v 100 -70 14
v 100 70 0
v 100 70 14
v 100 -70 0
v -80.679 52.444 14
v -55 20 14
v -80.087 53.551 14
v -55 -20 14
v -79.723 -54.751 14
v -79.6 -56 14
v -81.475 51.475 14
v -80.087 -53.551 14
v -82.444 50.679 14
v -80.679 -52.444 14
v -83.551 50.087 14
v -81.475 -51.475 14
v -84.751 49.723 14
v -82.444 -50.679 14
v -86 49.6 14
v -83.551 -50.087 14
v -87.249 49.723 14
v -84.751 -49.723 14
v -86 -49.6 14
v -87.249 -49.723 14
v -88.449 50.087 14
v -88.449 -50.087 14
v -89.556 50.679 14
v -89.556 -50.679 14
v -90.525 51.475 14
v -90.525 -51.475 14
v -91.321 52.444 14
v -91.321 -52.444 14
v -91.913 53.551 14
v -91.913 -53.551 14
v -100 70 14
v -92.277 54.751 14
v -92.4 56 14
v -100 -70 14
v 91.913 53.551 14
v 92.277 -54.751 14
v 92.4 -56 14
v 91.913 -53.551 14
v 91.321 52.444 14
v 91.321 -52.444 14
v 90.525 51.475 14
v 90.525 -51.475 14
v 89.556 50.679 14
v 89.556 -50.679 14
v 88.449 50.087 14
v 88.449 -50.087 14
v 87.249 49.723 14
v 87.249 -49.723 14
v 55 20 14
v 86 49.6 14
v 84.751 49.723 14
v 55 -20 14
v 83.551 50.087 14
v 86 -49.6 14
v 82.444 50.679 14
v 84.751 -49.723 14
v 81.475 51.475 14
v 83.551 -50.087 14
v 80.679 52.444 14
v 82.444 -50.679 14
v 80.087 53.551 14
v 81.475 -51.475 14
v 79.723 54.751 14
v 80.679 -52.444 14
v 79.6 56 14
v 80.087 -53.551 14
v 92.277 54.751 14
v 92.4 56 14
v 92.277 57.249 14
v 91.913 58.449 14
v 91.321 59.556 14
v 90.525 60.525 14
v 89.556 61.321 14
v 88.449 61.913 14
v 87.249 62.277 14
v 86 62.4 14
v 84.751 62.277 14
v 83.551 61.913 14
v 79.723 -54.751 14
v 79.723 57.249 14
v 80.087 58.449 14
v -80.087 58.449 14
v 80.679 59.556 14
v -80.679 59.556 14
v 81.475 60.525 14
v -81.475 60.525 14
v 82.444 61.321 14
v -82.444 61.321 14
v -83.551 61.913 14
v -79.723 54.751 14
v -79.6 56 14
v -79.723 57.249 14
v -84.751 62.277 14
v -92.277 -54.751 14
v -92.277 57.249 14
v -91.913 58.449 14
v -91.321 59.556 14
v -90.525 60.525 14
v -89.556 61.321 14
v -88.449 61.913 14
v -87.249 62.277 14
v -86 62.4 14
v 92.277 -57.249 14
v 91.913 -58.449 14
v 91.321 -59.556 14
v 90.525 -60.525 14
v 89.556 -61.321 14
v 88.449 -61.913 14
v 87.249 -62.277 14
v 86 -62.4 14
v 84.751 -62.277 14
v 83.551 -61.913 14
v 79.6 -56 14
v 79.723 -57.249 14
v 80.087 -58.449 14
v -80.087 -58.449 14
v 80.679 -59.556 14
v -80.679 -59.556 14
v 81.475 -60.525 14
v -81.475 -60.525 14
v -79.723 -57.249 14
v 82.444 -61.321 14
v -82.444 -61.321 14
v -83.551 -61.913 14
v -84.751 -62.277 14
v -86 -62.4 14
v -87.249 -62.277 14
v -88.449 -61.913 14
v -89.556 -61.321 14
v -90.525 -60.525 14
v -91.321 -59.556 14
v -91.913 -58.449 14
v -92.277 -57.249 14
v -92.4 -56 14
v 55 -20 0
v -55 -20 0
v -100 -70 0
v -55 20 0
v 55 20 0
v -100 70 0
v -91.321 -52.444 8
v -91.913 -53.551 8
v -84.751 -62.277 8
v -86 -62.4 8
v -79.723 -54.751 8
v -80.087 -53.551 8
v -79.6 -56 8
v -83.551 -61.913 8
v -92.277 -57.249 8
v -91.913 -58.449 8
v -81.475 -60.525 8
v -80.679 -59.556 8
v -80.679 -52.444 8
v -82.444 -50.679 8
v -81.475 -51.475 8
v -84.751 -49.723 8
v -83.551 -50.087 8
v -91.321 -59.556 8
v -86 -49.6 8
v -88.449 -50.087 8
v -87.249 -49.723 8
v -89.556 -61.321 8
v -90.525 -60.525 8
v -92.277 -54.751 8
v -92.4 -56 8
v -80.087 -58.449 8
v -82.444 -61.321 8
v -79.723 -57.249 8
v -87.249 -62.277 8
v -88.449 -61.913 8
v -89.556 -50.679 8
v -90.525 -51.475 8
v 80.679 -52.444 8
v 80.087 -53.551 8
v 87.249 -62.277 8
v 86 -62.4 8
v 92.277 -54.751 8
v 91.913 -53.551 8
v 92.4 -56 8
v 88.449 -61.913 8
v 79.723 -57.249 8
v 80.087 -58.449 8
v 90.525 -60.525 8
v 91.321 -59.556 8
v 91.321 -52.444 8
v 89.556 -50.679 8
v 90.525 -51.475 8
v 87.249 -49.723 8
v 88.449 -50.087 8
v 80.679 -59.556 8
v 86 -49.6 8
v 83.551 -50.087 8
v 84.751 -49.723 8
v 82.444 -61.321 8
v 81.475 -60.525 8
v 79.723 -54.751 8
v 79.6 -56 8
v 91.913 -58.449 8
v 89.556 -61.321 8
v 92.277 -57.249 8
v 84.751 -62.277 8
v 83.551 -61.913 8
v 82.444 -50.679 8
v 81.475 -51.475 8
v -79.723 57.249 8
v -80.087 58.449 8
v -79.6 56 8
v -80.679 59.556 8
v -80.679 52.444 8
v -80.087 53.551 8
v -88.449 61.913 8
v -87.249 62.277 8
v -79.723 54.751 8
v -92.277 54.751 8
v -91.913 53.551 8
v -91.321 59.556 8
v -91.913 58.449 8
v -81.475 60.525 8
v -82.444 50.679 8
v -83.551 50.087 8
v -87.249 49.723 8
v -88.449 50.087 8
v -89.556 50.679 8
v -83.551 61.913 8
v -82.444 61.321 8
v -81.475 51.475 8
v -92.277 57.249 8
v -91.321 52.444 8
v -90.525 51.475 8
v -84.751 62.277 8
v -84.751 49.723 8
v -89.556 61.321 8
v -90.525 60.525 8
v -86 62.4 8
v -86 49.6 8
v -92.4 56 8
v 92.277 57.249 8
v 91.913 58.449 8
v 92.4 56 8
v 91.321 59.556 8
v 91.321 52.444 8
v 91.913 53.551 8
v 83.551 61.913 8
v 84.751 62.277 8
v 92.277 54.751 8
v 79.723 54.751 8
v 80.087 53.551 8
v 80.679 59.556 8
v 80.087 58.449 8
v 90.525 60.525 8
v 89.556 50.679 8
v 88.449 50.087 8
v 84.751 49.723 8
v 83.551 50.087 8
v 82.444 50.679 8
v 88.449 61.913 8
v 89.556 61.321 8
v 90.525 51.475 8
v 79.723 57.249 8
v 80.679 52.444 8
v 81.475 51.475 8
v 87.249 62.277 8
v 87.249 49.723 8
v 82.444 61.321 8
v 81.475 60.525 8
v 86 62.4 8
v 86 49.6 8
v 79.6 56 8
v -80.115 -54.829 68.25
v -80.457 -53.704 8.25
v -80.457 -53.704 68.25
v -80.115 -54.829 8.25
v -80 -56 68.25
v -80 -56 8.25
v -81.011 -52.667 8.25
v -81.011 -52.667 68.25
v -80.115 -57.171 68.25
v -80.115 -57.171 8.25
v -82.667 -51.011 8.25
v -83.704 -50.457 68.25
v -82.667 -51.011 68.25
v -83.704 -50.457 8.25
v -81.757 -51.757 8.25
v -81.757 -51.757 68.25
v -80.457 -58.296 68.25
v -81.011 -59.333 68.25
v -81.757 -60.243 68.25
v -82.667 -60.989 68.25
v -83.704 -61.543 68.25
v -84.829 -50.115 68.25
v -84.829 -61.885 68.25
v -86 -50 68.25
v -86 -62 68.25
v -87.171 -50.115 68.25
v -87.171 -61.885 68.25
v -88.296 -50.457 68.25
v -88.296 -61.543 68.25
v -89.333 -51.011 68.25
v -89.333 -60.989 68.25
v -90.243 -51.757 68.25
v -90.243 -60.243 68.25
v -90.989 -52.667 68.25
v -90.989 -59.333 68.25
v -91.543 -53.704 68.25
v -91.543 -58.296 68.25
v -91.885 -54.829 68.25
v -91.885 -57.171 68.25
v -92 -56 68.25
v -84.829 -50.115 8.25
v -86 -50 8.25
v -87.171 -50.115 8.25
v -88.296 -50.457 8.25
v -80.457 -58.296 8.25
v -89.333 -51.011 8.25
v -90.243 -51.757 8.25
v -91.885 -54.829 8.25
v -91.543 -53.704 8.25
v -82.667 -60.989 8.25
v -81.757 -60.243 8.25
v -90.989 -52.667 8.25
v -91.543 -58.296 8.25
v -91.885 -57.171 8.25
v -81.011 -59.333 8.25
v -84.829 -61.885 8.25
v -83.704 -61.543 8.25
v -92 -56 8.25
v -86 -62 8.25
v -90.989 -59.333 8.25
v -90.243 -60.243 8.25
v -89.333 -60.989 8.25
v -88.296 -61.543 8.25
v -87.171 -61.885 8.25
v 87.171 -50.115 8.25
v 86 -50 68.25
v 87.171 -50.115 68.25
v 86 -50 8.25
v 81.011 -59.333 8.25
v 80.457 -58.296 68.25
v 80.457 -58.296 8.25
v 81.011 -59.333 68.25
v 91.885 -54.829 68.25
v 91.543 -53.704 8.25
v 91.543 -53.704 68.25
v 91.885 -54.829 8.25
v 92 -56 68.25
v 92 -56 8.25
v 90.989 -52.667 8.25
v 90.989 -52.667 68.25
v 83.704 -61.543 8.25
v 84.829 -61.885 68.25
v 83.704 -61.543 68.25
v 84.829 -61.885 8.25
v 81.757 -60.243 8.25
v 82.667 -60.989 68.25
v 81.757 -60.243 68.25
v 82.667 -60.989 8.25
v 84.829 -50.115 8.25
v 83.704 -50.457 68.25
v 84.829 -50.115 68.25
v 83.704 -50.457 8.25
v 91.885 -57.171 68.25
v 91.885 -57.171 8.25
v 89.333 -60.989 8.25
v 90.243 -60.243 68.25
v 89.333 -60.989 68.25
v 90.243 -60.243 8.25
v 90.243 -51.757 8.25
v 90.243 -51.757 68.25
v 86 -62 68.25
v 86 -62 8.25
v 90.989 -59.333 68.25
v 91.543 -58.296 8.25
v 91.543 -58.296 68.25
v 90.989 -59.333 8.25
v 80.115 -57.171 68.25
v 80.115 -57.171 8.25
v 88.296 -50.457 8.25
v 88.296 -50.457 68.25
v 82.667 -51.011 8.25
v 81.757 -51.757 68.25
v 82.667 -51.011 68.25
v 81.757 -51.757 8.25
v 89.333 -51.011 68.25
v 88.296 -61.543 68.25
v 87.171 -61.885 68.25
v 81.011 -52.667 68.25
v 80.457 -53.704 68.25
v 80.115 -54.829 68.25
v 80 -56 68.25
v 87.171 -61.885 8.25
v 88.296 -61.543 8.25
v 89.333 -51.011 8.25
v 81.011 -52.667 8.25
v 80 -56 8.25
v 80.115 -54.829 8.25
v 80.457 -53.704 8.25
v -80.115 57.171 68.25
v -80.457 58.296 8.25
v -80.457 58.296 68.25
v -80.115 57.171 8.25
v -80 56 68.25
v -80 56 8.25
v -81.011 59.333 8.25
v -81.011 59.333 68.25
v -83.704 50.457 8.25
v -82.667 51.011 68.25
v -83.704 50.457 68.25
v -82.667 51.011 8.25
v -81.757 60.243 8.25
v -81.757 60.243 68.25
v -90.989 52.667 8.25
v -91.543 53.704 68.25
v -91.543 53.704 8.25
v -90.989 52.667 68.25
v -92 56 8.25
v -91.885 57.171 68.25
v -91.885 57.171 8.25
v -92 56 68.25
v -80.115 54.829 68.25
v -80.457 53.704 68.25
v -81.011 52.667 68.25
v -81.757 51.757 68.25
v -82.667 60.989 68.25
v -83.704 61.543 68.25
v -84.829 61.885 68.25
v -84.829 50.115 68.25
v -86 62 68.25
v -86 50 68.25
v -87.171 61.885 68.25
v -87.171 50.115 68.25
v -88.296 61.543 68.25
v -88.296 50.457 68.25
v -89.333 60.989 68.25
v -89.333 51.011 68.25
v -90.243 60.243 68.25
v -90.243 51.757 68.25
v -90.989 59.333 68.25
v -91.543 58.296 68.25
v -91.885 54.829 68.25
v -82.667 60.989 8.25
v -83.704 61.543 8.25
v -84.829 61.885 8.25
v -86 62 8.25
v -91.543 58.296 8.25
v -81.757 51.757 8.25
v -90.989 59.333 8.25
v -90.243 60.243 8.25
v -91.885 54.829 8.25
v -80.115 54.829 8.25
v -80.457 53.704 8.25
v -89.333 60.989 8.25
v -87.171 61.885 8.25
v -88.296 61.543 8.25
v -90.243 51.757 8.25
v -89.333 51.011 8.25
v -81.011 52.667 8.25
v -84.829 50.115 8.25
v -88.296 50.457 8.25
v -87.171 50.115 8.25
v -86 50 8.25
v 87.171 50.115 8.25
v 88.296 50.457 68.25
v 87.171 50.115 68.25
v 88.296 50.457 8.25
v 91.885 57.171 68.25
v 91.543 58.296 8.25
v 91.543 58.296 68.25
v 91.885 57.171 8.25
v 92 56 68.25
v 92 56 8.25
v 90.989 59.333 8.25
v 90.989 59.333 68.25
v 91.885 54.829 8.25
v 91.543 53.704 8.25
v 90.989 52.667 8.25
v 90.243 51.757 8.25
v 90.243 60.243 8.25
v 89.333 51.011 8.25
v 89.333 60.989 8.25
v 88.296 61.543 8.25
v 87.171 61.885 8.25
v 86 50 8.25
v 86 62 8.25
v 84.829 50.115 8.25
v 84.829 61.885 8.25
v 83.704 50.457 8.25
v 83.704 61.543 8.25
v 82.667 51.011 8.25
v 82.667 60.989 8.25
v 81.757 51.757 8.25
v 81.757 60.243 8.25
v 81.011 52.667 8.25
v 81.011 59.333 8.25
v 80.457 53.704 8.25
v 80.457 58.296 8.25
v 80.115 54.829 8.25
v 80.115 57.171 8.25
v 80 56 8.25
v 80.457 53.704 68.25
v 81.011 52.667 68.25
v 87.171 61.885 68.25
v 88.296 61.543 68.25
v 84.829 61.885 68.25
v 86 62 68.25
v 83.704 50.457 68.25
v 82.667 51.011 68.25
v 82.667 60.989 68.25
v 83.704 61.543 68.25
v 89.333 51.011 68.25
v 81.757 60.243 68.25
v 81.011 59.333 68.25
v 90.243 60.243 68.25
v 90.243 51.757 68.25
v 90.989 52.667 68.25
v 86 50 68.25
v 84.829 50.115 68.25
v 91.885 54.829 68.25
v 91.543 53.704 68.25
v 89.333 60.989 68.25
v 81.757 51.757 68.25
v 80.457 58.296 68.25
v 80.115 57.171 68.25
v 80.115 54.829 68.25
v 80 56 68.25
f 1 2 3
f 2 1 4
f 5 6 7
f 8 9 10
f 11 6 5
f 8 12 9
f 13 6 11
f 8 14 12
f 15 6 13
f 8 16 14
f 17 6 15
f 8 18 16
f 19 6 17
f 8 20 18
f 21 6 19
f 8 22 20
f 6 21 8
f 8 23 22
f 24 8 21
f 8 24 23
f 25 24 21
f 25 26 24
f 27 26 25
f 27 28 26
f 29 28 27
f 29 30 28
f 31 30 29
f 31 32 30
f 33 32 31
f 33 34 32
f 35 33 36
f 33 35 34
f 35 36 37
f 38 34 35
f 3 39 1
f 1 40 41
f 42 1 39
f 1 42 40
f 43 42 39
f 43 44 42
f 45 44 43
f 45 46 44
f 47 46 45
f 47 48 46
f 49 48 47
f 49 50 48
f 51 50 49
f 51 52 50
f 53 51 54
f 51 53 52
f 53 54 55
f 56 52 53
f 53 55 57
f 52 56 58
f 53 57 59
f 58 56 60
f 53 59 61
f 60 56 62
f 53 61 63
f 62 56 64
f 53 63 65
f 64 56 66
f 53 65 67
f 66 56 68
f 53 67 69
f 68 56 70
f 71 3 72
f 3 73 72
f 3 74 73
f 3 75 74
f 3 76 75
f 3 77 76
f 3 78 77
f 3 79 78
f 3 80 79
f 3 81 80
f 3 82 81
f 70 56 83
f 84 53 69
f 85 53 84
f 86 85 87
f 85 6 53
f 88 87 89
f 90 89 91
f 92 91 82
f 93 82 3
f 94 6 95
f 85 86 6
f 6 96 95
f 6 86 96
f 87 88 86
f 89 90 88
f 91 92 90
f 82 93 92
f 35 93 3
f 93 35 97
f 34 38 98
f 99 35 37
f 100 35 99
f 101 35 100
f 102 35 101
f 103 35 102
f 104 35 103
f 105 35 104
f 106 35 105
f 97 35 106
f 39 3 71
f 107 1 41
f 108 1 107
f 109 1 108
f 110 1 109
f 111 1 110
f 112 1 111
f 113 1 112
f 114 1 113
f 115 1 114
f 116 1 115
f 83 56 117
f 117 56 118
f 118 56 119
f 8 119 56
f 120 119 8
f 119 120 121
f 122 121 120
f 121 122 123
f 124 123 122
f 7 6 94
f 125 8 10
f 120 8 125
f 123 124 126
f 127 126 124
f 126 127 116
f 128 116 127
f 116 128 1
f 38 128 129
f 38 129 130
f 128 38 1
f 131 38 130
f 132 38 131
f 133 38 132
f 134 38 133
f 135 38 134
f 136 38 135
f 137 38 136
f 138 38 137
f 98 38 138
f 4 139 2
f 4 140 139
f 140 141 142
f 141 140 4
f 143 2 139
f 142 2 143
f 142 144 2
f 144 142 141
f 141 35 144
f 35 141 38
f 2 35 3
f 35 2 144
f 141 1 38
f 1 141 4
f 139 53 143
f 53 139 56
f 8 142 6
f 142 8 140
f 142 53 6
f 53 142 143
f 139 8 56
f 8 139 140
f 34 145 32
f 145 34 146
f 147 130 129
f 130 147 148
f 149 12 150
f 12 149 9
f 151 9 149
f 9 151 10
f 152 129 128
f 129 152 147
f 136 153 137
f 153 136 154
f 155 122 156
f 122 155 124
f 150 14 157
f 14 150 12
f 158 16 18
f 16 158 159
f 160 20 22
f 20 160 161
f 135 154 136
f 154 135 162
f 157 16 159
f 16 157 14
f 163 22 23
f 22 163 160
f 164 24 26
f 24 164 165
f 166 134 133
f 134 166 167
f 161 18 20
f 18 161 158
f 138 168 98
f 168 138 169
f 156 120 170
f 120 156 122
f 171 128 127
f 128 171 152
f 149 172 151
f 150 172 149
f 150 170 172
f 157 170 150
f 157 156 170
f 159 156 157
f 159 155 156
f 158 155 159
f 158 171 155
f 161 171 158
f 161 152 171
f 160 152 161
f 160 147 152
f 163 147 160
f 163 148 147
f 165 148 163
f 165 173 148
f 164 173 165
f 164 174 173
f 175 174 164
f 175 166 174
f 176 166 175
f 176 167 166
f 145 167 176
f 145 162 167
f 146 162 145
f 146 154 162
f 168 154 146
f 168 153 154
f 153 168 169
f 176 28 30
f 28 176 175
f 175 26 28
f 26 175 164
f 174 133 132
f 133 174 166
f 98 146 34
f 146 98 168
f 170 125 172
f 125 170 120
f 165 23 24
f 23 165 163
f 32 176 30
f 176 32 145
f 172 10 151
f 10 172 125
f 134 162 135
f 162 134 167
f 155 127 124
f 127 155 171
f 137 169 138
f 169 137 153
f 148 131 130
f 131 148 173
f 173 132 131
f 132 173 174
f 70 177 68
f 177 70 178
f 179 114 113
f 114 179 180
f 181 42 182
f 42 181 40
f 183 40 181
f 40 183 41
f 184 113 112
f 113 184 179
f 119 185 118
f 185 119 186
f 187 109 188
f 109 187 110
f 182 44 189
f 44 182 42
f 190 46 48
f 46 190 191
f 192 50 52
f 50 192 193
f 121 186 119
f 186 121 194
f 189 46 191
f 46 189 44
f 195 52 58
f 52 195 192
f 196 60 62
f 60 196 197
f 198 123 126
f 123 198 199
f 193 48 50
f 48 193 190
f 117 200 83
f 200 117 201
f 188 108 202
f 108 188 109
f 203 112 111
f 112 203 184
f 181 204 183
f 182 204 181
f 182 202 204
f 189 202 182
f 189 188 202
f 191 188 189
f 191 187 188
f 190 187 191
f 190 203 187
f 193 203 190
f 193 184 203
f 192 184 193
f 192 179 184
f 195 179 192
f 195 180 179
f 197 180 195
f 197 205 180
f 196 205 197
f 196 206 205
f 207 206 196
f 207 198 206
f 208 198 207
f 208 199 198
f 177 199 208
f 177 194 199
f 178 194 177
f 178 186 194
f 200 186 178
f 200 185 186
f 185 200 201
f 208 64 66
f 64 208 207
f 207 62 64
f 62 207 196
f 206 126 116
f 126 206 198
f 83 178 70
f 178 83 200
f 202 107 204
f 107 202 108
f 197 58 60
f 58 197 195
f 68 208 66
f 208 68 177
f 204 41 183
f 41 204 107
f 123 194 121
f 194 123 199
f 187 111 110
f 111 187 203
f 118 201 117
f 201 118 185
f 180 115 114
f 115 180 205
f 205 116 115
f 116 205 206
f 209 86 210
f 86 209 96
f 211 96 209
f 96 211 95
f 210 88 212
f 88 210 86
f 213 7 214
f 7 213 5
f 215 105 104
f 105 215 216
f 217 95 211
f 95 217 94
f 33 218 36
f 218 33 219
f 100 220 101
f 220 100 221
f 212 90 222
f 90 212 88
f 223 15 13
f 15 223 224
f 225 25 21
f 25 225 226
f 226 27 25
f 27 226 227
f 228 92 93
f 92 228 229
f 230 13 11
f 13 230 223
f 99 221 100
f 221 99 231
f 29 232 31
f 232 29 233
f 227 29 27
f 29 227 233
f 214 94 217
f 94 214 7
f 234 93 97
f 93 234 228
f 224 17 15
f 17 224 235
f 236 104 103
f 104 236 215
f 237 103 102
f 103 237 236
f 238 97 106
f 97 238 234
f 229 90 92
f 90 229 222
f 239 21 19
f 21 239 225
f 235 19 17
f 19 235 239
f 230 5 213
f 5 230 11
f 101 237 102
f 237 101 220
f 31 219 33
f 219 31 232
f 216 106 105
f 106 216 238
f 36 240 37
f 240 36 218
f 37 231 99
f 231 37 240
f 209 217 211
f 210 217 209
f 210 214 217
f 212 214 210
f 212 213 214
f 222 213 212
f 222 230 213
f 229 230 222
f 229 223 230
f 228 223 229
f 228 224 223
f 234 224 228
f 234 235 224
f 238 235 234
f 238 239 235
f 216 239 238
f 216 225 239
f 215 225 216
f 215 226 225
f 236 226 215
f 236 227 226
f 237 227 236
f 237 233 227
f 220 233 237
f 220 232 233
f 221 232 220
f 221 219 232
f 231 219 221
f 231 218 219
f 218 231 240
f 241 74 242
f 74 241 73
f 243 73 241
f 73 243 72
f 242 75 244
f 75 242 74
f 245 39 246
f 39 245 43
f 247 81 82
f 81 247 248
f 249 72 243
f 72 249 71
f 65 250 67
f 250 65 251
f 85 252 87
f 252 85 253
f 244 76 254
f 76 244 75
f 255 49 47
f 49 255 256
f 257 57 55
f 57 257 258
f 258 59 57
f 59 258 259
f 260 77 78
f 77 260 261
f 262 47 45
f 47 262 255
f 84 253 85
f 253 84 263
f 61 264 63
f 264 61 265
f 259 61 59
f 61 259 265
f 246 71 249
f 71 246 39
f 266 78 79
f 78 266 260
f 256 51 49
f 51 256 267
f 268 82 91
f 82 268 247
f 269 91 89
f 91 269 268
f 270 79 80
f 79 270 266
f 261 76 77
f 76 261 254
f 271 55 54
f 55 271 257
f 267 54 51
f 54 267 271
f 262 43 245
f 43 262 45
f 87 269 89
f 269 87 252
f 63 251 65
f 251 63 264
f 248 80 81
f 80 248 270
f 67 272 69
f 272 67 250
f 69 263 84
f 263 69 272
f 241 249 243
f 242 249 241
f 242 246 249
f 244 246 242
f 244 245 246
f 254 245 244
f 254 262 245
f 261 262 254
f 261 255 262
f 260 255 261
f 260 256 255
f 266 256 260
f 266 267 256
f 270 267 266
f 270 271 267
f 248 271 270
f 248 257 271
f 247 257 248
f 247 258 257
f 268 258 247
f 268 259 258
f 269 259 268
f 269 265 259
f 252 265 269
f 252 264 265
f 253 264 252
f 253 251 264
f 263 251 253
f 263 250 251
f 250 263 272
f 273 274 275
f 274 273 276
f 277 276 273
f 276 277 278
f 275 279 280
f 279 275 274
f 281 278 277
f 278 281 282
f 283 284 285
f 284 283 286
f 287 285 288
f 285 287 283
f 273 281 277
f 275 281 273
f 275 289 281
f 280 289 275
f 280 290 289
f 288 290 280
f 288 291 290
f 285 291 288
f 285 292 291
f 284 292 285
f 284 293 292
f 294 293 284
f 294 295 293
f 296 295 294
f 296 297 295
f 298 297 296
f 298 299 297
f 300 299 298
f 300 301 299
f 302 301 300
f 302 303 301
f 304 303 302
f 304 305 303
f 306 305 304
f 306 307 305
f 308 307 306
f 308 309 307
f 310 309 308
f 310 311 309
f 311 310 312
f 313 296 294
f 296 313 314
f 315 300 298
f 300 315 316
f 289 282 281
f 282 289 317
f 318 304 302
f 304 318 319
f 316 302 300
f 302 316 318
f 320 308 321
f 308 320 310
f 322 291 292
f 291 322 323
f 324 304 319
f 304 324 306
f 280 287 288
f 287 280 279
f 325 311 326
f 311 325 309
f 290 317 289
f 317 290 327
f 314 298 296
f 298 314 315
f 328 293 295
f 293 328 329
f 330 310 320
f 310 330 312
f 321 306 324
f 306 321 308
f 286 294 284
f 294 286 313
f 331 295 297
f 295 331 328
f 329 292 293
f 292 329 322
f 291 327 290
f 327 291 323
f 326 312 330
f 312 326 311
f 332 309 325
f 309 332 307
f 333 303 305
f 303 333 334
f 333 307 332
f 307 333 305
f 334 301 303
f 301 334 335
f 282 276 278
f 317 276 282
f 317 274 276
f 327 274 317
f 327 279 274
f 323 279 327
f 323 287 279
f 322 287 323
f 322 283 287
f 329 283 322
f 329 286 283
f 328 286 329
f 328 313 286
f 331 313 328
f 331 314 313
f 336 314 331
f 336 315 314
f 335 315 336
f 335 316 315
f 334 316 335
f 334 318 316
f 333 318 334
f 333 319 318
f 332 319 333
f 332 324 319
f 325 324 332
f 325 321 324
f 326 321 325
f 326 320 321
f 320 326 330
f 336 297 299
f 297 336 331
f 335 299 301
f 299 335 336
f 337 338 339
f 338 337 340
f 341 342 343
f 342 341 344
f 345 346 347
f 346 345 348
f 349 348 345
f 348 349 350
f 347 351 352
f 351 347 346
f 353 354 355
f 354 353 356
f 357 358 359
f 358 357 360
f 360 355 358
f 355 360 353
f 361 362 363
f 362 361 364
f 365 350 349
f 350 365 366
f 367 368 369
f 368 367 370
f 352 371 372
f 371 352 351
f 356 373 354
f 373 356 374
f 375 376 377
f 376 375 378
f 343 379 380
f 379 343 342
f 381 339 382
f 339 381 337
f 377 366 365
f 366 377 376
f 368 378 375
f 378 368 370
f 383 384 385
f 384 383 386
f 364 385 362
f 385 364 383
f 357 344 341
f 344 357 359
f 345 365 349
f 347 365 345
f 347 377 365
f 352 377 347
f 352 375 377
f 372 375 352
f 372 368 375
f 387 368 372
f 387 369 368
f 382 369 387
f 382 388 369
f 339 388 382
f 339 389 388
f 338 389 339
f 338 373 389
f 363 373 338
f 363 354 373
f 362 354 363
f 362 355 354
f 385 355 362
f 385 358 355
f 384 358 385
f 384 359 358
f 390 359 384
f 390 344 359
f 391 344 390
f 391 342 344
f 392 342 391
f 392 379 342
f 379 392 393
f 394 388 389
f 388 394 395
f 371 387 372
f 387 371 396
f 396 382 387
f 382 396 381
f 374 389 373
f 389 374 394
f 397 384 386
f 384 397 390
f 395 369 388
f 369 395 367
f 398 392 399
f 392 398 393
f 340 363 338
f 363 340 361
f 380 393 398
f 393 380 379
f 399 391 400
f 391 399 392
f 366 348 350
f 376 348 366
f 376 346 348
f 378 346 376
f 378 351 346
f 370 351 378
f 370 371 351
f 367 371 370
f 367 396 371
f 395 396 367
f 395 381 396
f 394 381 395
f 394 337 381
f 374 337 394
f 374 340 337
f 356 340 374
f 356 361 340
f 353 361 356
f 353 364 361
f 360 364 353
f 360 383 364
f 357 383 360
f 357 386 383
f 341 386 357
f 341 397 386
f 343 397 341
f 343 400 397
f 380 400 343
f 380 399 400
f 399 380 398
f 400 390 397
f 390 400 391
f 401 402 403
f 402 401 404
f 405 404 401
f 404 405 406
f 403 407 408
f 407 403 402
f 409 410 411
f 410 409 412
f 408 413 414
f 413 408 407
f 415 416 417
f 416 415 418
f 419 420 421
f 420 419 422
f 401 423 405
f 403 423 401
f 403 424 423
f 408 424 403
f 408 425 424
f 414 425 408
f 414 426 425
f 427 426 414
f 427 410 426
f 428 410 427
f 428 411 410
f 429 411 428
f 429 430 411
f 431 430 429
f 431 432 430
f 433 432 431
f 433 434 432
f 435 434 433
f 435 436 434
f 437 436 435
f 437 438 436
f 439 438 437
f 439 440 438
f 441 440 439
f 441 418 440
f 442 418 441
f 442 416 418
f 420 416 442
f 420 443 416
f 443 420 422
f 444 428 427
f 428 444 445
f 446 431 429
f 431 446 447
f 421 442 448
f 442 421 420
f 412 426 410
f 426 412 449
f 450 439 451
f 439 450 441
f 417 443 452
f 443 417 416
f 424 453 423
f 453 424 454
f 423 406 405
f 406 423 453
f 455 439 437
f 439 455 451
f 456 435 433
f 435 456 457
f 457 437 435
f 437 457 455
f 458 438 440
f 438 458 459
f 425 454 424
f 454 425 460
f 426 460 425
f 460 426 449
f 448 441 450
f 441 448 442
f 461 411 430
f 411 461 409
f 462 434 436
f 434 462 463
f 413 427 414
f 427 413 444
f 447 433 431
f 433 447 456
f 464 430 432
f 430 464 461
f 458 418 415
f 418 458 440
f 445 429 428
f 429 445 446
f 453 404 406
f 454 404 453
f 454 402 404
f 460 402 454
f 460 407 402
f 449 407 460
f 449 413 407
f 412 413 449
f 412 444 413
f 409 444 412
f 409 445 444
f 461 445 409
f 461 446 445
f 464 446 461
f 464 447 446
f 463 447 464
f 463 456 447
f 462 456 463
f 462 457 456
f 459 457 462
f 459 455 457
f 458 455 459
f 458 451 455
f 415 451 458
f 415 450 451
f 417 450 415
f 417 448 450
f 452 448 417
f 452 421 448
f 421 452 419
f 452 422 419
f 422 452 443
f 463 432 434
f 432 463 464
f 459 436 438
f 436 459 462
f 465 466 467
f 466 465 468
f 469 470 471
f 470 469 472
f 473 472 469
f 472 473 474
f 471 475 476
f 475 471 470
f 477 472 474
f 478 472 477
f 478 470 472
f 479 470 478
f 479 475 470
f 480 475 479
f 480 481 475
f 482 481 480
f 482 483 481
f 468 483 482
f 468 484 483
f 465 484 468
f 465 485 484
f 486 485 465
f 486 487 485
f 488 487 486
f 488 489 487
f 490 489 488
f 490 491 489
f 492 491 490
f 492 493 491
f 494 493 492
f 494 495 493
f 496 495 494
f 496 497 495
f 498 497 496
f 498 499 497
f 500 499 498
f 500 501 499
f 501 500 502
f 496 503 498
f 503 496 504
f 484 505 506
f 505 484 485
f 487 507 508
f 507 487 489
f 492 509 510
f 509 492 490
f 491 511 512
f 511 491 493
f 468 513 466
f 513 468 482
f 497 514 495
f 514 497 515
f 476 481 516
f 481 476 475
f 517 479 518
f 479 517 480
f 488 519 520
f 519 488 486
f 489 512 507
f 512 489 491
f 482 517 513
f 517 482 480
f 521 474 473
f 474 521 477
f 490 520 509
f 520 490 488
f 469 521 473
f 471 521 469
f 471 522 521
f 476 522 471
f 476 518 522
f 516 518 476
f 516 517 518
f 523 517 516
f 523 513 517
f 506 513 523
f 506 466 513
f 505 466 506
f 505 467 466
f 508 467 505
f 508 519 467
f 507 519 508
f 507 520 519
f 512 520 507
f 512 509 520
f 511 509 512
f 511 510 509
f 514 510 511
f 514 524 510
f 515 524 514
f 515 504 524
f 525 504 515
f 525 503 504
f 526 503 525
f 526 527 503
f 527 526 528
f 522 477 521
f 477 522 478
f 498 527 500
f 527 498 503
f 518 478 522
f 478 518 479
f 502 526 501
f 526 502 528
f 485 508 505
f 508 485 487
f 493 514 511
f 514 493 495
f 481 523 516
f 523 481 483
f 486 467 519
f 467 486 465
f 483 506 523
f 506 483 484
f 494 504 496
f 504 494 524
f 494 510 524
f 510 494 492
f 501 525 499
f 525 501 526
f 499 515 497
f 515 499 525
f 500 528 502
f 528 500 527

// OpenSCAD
$fn = 32;

// ------------------------------------------------------------------------
// Frame with four posts: 200 x 140 mm frame, four d12 posts
// Every part is its own module, assembly() places them once.
// ------------------------------------------------------------------------

// --- part 1 ---
module base_frame() {
  difference() {
    translate([-100, -70, 0]) cube([200, 140, 14]);
    translate([-55, -20, -1]) cube([110, 40, 16]);
    translate([-86, -56, 8]) cylinder(h = 7, d = 12.8);
    translate([86, -56, 8]) cylinder(h = 7, d = 12.8);
    translate([-86, 56, 8]) cylinder(h = 7, d = 12.8);
    translate([86, 56, 8]) cylinder(h = 7, d = 12.8);
  }
}

// --- part 2 ---
module post1() {
  cylinder(h = 60, d = 12);
}

// --- part 3 ---
module post2() {
  cylinder(h = 60, d = 12);
}

// --- part 4 ---
module post3() {
  cylinder(h = 60, d = 12);
}

// --- part 5 ---
module post4() {
  cylinder(h = 60, d = 12);
}

// --- assembly ---
module assembly() {
  translate([0, 0, 0]) rotate([0, 0, 0]) base_frame();
  translate([-86, -56, 8.25]) rotate([0, 0, 0]) post1();
  translate([86, -56, 8.25]) rotate([0, 0, 0]) post2();
  translate([-86, 56, 8.25]) rotate([0, 0, 0]) post3();
  translate([86, 56, 8.25]) rotate([0, 0, 0]) post4();
}

assembly();
